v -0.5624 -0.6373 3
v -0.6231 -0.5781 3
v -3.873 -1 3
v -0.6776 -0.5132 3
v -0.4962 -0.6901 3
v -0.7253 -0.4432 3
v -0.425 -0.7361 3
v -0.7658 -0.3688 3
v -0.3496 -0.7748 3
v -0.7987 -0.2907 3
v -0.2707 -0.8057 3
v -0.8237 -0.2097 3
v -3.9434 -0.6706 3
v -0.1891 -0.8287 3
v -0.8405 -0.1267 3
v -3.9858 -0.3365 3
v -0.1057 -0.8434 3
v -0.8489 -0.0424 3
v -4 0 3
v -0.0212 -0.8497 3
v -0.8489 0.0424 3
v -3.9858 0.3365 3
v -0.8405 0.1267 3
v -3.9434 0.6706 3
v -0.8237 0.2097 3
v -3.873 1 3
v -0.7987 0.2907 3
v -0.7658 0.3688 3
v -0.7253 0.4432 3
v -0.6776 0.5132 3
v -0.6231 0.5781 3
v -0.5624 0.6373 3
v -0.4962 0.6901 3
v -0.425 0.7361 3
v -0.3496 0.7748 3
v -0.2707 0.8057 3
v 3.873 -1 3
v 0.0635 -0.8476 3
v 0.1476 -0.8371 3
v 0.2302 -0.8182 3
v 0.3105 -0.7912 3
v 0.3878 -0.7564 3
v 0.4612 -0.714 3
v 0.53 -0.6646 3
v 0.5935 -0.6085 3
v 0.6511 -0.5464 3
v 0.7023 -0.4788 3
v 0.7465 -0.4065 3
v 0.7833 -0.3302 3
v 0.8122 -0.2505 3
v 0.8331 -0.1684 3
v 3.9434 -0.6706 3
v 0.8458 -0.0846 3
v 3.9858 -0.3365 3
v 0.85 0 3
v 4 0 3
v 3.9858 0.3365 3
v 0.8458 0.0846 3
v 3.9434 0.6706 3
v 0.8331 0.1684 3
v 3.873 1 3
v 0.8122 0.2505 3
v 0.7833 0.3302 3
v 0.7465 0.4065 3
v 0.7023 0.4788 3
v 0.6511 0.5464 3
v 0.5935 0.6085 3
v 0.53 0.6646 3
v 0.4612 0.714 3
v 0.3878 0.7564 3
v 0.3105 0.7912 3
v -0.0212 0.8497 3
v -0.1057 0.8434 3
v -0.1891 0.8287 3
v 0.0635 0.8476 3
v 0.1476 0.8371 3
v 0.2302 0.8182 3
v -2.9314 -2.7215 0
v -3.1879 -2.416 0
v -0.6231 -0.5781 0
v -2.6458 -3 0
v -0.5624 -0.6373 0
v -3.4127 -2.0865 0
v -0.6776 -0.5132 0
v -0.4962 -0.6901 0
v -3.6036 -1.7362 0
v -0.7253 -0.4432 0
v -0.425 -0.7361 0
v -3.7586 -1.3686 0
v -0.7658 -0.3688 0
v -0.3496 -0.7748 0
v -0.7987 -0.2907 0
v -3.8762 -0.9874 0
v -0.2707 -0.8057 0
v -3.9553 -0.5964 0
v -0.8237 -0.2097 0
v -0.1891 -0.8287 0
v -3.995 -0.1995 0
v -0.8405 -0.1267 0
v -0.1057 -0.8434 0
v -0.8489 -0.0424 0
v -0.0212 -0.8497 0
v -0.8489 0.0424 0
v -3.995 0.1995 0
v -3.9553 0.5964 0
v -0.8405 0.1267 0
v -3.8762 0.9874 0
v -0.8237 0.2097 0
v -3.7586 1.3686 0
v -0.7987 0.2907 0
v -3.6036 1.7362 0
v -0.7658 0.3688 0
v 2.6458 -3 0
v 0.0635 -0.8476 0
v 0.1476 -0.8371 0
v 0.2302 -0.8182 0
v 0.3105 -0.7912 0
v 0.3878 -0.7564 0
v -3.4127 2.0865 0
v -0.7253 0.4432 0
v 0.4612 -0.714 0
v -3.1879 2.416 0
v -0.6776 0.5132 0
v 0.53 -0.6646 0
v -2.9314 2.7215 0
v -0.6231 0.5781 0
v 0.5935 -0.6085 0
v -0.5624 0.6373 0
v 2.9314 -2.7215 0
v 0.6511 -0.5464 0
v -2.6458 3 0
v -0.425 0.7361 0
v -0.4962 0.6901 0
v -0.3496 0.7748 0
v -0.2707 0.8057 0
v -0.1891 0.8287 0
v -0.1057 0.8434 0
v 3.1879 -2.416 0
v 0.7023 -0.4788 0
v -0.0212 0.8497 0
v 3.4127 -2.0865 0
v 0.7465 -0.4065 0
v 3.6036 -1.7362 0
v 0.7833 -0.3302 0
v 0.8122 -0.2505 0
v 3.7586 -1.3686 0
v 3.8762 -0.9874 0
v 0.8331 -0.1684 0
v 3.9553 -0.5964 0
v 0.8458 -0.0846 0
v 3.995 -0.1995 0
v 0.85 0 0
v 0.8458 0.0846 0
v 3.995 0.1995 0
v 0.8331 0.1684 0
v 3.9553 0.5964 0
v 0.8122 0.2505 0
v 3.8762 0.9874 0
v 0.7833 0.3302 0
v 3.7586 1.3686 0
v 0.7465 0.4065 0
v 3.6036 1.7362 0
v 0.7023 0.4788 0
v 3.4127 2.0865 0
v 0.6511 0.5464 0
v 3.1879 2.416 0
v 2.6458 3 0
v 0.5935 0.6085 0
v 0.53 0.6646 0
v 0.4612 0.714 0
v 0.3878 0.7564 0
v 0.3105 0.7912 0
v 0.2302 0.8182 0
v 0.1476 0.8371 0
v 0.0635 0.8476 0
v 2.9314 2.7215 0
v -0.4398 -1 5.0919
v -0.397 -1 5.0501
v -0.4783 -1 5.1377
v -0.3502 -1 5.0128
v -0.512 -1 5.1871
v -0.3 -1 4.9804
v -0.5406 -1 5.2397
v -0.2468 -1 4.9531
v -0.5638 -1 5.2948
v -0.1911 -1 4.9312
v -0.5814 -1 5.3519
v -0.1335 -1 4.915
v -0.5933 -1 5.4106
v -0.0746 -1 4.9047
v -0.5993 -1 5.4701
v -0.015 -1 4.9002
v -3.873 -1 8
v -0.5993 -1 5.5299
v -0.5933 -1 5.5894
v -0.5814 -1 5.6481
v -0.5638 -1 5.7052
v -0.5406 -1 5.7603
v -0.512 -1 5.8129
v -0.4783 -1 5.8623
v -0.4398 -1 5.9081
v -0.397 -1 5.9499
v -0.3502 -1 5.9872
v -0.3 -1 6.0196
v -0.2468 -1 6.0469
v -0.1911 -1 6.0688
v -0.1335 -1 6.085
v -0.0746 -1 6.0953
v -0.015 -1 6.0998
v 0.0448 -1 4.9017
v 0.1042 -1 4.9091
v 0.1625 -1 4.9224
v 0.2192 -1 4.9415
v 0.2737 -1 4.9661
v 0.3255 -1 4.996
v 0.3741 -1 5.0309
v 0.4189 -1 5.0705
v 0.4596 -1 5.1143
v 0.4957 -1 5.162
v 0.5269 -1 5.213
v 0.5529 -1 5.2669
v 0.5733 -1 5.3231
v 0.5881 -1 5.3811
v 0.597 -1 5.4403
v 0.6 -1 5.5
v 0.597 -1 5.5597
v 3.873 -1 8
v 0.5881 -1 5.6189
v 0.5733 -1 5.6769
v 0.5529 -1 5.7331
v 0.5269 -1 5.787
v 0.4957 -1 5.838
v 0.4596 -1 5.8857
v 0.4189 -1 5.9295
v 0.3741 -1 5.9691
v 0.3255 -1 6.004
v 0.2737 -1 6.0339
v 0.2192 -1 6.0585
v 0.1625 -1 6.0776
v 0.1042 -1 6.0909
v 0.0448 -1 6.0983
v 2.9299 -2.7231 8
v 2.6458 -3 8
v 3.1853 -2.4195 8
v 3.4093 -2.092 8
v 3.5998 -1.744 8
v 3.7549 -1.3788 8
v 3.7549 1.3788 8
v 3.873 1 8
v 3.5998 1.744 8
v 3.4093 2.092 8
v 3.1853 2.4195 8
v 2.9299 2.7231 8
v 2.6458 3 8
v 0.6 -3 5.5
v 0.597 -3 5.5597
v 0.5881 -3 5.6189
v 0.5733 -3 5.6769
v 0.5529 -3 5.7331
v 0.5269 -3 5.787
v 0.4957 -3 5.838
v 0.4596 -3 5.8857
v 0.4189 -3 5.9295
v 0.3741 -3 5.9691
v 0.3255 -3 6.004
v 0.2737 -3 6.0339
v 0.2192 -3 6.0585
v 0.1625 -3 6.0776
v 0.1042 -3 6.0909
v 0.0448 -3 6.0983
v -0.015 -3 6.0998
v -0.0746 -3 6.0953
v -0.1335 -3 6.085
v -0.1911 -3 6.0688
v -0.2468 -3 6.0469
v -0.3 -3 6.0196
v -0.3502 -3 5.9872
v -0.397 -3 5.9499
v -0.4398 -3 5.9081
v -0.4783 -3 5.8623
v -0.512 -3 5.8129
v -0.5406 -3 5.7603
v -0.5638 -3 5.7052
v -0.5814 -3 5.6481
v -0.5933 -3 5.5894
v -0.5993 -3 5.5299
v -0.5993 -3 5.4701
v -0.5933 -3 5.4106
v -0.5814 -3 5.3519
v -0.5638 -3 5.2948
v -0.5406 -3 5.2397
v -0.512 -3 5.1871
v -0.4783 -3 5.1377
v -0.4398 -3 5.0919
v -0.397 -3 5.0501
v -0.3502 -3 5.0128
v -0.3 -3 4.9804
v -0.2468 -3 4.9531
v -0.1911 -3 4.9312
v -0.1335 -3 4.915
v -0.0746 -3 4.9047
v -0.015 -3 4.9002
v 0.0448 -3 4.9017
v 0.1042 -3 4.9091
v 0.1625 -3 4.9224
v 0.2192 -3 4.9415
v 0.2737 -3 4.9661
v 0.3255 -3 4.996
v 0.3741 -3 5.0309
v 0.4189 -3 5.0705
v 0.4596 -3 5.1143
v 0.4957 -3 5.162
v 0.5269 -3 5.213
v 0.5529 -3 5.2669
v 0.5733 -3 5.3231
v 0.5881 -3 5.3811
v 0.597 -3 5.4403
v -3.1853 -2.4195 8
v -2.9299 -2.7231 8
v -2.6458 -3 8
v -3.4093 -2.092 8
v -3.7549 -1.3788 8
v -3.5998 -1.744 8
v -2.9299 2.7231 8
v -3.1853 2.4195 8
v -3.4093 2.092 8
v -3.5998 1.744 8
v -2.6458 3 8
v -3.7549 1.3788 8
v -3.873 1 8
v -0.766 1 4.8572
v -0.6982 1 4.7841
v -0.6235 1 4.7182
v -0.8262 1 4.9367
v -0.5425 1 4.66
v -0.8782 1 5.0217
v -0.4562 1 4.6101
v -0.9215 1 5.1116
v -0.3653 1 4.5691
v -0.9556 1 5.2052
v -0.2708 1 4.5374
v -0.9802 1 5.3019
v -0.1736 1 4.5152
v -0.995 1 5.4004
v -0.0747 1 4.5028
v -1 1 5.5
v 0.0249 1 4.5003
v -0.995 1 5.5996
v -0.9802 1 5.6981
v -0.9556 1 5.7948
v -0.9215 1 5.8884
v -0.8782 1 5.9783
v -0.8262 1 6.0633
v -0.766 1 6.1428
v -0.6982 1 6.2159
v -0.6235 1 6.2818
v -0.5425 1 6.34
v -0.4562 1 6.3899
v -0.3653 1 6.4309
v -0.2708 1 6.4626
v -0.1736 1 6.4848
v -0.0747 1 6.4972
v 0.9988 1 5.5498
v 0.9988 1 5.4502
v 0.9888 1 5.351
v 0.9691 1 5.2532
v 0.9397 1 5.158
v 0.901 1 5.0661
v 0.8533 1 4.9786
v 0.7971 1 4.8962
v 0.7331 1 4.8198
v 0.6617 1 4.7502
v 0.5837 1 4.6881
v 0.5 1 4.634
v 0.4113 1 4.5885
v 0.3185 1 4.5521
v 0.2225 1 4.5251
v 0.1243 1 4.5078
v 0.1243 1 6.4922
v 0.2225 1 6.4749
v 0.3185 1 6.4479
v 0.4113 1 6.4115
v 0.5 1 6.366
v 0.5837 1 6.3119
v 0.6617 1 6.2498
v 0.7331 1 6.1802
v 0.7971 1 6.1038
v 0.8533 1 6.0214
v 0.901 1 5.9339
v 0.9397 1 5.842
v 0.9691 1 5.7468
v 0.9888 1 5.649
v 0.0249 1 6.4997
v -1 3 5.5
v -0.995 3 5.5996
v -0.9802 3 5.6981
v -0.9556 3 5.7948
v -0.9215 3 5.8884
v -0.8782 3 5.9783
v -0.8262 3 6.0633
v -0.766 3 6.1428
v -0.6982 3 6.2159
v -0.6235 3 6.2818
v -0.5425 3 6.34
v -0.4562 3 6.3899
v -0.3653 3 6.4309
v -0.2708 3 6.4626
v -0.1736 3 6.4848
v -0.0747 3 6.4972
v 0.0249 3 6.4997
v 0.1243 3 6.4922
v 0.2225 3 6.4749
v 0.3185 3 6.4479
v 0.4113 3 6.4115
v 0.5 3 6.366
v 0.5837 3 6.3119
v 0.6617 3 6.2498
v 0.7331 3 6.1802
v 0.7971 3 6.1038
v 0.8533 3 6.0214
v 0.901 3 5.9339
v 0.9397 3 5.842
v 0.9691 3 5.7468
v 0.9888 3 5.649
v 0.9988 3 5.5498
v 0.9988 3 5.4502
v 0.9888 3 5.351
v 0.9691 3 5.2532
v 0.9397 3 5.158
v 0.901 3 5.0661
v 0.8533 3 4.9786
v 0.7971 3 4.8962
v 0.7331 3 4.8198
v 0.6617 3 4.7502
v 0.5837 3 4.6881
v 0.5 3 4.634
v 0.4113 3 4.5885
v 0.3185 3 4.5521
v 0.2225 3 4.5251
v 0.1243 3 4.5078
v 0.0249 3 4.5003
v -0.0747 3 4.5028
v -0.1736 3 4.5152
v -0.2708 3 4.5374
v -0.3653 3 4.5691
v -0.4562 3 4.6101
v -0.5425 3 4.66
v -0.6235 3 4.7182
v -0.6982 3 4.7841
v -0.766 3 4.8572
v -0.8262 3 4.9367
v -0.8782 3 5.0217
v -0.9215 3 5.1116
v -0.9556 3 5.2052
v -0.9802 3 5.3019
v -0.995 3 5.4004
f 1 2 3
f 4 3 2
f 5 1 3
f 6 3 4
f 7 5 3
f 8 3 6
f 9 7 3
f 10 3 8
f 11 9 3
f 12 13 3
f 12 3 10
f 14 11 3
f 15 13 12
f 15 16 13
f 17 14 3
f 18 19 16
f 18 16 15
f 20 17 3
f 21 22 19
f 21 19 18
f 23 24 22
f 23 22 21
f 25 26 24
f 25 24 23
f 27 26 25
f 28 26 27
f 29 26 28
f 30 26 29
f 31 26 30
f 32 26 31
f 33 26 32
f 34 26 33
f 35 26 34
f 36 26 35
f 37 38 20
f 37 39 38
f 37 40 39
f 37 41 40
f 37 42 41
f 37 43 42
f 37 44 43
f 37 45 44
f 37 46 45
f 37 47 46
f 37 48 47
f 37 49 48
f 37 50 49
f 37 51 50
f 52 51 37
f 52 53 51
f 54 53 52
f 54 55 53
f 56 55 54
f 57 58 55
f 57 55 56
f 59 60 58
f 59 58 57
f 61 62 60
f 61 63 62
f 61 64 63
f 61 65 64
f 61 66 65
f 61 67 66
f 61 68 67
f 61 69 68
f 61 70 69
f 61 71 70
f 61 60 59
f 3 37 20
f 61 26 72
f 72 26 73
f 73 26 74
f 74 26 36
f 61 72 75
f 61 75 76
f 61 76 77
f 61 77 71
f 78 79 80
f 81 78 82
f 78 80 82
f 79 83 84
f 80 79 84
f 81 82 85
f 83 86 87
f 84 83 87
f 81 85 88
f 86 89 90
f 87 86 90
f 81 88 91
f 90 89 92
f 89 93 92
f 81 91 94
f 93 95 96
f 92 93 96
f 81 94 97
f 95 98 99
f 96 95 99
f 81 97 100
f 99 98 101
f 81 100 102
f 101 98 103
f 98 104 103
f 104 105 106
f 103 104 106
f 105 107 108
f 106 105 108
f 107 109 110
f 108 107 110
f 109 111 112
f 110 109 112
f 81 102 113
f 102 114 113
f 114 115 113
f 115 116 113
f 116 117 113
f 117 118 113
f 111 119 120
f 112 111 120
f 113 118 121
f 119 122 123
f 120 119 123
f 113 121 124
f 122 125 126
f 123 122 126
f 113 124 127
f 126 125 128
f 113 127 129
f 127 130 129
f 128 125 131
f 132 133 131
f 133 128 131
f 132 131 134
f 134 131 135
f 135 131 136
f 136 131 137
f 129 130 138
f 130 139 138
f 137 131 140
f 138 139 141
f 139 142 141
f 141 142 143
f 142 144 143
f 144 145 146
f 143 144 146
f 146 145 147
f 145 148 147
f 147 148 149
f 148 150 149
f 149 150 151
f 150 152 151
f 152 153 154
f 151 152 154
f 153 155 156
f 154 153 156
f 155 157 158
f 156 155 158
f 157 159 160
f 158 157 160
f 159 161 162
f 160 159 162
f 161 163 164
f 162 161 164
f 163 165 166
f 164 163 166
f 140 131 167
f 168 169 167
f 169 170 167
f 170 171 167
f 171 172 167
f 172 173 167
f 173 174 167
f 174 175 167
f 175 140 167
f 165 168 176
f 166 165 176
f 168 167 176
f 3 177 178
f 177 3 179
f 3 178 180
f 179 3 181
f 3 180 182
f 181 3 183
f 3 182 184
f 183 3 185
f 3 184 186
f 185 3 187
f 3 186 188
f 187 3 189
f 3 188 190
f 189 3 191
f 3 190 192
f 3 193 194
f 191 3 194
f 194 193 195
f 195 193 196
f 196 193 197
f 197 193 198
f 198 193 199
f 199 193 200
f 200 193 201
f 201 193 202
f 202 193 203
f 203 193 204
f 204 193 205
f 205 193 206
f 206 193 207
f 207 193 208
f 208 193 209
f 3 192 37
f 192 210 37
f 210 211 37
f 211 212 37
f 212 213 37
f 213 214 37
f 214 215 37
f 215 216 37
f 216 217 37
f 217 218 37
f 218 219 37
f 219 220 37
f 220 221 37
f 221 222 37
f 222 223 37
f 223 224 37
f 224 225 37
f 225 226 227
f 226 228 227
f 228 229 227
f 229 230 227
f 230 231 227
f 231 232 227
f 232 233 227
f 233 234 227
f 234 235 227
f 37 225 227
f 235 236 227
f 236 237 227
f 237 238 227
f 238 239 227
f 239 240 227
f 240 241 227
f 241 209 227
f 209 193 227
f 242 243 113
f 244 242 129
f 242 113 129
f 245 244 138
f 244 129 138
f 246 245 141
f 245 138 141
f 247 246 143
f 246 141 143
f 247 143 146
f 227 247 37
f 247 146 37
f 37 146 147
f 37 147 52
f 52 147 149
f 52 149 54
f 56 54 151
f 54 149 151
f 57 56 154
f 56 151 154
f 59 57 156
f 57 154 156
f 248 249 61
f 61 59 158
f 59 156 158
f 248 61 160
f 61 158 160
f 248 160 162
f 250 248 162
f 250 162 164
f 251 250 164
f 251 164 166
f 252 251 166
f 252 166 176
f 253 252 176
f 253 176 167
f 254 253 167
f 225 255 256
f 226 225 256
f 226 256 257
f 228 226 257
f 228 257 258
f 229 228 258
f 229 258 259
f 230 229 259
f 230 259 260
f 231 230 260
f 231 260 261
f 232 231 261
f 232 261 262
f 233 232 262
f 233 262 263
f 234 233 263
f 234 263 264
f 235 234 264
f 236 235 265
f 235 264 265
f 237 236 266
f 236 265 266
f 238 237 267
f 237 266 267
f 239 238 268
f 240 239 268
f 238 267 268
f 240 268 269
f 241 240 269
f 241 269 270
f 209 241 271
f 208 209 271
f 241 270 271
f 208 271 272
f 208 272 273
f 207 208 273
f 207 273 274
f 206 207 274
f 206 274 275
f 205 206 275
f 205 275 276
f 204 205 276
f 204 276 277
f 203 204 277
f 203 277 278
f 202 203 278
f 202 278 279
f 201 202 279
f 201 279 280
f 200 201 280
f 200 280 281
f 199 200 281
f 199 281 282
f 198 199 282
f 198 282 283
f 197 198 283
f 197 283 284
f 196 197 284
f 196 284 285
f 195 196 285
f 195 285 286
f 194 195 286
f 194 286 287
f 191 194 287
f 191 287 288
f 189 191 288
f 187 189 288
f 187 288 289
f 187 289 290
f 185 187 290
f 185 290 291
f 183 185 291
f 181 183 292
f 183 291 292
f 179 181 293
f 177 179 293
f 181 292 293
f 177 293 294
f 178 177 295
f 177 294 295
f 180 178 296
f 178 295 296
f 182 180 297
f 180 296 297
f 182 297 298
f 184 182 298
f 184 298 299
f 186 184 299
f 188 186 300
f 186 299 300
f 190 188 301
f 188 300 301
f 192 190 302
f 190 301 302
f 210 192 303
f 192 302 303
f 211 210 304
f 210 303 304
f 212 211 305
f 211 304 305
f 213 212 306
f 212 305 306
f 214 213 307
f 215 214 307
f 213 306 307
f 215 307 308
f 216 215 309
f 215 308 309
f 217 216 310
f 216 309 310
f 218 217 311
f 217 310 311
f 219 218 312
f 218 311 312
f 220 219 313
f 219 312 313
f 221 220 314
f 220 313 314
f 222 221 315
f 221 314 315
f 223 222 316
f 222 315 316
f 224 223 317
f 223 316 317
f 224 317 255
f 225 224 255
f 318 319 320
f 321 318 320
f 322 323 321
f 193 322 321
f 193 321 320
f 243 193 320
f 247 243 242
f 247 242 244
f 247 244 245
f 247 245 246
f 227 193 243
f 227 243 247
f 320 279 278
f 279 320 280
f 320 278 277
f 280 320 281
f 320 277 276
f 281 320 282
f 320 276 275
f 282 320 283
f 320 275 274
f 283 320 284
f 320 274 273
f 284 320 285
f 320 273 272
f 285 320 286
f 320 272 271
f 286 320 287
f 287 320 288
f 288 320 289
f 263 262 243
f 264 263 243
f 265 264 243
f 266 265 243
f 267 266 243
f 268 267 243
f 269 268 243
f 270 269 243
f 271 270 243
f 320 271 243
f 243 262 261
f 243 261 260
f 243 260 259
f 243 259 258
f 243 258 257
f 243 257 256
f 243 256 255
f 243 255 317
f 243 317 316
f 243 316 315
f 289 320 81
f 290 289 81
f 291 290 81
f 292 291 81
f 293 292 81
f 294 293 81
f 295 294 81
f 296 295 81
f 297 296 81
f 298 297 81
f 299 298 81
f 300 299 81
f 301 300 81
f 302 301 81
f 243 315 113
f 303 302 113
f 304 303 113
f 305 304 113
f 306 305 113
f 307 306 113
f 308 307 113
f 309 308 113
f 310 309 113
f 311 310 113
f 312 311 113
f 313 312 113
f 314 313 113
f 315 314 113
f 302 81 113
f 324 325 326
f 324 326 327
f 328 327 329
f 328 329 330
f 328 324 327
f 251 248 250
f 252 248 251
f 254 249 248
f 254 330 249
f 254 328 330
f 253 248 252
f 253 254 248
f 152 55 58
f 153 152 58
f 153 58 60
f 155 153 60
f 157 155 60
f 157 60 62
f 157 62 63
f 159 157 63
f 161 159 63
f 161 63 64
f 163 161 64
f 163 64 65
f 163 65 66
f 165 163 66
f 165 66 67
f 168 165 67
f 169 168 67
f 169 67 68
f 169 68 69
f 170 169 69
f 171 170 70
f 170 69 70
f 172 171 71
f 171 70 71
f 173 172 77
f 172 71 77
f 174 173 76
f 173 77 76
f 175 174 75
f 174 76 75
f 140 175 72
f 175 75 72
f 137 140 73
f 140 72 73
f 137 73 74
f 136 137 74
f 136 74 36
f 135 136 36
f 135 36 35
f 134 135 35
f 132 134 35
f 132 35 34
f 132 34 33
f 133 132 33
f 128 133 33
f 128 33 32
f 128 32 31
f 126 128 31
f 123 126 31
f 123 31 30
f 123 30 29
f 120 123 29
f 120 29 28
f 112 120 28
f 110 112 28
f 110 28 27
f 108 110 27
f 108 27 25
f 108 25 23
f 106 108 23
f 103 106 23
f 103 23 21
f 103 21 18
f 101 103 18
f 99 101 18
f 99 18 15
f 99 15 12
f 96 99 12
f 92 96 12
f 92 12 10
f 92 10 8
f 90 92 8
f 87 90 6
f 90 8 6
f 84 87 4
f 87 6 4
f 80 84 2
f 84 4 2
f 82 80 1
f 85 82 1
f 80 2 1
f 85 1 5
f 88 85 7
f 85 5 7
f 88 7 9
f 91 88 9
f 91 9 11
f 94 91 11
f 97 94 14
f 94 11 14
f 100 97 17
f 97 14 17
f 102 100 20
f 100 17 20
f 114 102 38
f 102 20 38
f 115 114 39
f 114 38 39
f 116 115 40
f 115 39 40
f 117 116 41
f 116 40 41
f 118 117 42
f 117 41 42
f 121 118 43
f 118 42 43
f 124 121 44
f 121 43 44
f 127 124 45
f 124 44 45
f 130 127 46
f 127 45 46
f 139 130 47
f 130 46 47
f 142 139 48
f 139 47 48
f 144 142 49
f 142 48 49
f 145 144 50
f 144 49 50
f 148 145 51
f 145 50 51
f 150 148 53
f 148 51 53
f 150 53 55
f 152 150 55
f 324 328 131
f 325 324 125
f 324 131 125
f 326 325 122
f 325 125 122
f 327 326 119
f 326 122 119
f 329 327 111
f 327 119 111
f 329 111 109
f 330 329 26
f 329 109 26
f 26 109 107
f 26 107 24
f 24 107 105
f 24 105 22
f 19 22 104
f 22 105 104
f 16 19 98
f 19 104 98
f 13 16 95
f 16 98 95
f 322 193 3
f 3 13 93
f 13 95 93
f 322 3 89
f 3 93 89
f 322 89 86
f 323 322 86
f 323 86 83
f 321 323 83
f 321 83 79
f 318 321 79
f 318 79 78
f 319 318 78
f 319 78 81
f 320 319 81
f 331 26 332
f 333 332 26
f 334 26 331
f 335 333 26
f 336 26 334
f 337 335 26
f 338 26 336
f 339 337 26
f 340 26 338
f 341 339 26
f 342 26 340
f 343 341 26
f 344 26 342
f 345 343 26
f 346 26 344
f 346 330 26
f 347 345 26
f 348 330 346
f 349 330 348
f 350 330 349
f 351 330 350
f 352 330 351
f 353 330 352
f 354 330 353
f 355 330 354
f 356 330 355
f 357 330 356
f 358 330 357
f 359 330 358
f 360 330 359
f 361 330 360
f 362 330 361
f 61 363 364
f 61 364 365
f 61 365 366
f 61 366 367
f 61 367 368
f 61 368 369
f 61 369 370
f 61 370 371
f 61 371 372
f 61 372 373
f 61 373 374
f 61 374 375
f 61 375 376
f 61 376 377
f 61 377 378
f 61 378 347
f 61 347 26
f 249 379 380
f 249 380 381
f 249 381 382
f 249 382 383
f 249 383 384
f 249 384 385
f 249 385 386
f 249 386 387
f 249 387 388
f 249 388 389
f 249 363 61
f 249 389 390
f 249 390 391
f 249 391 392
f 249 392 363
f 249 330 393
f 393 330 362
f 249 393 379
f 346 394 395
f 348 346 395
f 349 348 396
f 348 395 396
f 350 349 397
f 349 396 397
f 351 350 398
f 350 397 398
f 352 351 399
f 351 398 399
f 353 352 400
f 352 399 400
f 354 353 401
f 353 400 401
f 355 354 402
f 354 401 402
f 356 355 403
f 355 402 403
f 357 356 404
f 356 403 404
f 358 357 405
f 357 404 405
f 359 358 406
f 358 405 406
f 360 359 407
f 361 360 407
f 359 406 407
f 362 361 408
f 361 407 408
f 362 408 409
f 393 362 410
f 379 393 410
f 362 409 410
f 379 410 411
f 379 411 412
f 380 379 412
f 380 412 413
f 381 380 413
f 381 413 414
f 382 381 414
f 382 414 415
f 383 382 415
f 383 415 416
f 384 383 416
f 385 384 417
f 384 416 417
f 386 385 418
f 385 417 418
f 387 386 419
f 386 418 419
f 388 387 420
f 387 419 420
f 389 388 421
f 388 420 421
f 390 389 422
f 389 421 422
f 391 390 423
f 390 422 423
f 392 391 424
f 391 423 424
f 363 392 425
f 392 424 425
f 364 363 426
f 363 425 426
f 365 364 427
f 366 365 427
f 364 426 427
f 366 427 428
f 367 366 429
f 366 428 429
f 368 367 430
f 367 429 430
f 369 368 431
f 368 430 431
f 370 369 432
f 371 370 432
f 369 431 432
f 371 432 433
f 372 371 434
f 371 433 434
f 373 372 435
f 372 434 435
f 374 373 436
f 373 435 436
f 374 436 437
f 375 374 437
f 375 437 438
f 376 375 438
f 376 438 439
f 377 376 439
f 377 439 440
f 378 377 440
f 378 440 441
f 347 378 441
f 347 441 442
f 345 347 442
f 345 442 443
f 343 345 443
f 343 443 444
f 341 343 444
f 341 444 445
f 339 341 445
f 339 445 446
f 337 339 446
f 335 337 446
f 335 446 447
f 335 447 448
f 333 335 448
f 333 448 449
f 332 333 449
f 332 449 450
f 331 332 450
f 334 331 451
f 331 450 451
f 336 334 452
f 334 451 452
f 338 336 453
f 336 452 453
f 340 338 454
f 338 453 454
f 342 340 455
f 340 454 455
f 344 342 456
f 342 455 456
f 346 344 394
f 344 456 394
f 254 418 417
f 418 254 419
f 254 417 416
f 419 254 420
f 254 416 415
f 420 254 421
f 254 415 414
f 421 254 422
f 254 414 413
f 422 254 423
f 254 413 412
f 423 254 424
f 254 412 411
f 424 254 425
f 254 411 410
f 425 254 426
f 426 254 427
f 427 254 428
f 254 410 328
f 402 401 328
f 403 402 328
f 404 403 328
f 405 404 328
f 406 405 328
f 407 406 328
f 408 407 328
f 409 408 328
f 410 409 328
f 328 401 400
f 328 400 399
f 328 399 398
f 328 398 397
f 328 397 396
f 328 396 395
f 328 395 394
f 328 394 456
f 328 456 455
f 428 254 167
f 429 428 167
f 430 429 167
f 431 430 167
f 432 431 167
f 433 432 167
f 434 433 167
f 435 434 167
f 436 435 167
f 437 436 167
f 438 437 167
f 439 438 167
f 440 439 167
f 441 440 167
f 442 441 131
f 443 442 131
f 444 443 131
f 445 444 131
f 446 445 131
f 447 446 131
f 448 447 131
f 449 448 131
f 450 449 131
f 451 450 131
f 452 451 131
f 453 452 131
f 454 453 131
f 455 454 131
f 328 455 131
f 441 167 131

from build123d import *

# Parameters (mm, degrees)
F1_DEPTH = 8
F2_W     = 9.163002
F2_H     = 2
F3_DEPTH = 5
F4_R     = 0.6
F5_DEPTH = 6.001
F6_R     = 1
F7_DEPTH = 2
F8_R     = 0.85
F9_DEPTH = 3.001


with BuildPart() as f1:
    # F0 (on Top) → F1 (new body)
    with BuildSketch(Plane.XY):
        with BuildLine():
            Line((2.645751, 3), (-2.645751, 3))
            ThreePointArc((-2.645751, 3), (-4, 0), (-2.645751, -3))
            Line((-2.645751, -3), (2.645751, -3))
            ThreePointArc((2.645751, -3), (4, 0), (2.645751, 3))
        make_face()
    extrude(amount=F1_DEPTH)

    # F2 (on face) → F3 (cut)
    with BuildSketch(Plane.XY.offset(8)):
        Rectangle(F2_W, F2_H)
    extrude(amount=-F3_DEPTH, mode=Mode.SUBTRACT)

    # F4 (on face) → F5 (cut, through all)
    with BuildSketch(Plane.XZ.offset(3)):
        with Locations((0, 5.5)):
            Circle(F4_R)
    extrude(amount=-F5_DEPTH, mode=Mode.SUBTRACT)

    # F6 (on face) → F7 (cut, through all)
    with BuildSketch(Plane(origin=(0, 3, 0), x_dir=(-1, 0, 0), z_dir=(0, 1, 0))):
        with Locations((0, 5.5)):
            Circle(F6_R)
    extrude(amount=-F7_DEPTH, mode=Mode.SUBTRACT)

    # F8 (on face) → F9 (cut, through all)
    with BuildSketch(Plane.XY.offset(3)):
        Circle(F8_R)
    extrude(amount=-F9_DEPTH, mode=Mode.SUBTRACT)


solid = f1.part
